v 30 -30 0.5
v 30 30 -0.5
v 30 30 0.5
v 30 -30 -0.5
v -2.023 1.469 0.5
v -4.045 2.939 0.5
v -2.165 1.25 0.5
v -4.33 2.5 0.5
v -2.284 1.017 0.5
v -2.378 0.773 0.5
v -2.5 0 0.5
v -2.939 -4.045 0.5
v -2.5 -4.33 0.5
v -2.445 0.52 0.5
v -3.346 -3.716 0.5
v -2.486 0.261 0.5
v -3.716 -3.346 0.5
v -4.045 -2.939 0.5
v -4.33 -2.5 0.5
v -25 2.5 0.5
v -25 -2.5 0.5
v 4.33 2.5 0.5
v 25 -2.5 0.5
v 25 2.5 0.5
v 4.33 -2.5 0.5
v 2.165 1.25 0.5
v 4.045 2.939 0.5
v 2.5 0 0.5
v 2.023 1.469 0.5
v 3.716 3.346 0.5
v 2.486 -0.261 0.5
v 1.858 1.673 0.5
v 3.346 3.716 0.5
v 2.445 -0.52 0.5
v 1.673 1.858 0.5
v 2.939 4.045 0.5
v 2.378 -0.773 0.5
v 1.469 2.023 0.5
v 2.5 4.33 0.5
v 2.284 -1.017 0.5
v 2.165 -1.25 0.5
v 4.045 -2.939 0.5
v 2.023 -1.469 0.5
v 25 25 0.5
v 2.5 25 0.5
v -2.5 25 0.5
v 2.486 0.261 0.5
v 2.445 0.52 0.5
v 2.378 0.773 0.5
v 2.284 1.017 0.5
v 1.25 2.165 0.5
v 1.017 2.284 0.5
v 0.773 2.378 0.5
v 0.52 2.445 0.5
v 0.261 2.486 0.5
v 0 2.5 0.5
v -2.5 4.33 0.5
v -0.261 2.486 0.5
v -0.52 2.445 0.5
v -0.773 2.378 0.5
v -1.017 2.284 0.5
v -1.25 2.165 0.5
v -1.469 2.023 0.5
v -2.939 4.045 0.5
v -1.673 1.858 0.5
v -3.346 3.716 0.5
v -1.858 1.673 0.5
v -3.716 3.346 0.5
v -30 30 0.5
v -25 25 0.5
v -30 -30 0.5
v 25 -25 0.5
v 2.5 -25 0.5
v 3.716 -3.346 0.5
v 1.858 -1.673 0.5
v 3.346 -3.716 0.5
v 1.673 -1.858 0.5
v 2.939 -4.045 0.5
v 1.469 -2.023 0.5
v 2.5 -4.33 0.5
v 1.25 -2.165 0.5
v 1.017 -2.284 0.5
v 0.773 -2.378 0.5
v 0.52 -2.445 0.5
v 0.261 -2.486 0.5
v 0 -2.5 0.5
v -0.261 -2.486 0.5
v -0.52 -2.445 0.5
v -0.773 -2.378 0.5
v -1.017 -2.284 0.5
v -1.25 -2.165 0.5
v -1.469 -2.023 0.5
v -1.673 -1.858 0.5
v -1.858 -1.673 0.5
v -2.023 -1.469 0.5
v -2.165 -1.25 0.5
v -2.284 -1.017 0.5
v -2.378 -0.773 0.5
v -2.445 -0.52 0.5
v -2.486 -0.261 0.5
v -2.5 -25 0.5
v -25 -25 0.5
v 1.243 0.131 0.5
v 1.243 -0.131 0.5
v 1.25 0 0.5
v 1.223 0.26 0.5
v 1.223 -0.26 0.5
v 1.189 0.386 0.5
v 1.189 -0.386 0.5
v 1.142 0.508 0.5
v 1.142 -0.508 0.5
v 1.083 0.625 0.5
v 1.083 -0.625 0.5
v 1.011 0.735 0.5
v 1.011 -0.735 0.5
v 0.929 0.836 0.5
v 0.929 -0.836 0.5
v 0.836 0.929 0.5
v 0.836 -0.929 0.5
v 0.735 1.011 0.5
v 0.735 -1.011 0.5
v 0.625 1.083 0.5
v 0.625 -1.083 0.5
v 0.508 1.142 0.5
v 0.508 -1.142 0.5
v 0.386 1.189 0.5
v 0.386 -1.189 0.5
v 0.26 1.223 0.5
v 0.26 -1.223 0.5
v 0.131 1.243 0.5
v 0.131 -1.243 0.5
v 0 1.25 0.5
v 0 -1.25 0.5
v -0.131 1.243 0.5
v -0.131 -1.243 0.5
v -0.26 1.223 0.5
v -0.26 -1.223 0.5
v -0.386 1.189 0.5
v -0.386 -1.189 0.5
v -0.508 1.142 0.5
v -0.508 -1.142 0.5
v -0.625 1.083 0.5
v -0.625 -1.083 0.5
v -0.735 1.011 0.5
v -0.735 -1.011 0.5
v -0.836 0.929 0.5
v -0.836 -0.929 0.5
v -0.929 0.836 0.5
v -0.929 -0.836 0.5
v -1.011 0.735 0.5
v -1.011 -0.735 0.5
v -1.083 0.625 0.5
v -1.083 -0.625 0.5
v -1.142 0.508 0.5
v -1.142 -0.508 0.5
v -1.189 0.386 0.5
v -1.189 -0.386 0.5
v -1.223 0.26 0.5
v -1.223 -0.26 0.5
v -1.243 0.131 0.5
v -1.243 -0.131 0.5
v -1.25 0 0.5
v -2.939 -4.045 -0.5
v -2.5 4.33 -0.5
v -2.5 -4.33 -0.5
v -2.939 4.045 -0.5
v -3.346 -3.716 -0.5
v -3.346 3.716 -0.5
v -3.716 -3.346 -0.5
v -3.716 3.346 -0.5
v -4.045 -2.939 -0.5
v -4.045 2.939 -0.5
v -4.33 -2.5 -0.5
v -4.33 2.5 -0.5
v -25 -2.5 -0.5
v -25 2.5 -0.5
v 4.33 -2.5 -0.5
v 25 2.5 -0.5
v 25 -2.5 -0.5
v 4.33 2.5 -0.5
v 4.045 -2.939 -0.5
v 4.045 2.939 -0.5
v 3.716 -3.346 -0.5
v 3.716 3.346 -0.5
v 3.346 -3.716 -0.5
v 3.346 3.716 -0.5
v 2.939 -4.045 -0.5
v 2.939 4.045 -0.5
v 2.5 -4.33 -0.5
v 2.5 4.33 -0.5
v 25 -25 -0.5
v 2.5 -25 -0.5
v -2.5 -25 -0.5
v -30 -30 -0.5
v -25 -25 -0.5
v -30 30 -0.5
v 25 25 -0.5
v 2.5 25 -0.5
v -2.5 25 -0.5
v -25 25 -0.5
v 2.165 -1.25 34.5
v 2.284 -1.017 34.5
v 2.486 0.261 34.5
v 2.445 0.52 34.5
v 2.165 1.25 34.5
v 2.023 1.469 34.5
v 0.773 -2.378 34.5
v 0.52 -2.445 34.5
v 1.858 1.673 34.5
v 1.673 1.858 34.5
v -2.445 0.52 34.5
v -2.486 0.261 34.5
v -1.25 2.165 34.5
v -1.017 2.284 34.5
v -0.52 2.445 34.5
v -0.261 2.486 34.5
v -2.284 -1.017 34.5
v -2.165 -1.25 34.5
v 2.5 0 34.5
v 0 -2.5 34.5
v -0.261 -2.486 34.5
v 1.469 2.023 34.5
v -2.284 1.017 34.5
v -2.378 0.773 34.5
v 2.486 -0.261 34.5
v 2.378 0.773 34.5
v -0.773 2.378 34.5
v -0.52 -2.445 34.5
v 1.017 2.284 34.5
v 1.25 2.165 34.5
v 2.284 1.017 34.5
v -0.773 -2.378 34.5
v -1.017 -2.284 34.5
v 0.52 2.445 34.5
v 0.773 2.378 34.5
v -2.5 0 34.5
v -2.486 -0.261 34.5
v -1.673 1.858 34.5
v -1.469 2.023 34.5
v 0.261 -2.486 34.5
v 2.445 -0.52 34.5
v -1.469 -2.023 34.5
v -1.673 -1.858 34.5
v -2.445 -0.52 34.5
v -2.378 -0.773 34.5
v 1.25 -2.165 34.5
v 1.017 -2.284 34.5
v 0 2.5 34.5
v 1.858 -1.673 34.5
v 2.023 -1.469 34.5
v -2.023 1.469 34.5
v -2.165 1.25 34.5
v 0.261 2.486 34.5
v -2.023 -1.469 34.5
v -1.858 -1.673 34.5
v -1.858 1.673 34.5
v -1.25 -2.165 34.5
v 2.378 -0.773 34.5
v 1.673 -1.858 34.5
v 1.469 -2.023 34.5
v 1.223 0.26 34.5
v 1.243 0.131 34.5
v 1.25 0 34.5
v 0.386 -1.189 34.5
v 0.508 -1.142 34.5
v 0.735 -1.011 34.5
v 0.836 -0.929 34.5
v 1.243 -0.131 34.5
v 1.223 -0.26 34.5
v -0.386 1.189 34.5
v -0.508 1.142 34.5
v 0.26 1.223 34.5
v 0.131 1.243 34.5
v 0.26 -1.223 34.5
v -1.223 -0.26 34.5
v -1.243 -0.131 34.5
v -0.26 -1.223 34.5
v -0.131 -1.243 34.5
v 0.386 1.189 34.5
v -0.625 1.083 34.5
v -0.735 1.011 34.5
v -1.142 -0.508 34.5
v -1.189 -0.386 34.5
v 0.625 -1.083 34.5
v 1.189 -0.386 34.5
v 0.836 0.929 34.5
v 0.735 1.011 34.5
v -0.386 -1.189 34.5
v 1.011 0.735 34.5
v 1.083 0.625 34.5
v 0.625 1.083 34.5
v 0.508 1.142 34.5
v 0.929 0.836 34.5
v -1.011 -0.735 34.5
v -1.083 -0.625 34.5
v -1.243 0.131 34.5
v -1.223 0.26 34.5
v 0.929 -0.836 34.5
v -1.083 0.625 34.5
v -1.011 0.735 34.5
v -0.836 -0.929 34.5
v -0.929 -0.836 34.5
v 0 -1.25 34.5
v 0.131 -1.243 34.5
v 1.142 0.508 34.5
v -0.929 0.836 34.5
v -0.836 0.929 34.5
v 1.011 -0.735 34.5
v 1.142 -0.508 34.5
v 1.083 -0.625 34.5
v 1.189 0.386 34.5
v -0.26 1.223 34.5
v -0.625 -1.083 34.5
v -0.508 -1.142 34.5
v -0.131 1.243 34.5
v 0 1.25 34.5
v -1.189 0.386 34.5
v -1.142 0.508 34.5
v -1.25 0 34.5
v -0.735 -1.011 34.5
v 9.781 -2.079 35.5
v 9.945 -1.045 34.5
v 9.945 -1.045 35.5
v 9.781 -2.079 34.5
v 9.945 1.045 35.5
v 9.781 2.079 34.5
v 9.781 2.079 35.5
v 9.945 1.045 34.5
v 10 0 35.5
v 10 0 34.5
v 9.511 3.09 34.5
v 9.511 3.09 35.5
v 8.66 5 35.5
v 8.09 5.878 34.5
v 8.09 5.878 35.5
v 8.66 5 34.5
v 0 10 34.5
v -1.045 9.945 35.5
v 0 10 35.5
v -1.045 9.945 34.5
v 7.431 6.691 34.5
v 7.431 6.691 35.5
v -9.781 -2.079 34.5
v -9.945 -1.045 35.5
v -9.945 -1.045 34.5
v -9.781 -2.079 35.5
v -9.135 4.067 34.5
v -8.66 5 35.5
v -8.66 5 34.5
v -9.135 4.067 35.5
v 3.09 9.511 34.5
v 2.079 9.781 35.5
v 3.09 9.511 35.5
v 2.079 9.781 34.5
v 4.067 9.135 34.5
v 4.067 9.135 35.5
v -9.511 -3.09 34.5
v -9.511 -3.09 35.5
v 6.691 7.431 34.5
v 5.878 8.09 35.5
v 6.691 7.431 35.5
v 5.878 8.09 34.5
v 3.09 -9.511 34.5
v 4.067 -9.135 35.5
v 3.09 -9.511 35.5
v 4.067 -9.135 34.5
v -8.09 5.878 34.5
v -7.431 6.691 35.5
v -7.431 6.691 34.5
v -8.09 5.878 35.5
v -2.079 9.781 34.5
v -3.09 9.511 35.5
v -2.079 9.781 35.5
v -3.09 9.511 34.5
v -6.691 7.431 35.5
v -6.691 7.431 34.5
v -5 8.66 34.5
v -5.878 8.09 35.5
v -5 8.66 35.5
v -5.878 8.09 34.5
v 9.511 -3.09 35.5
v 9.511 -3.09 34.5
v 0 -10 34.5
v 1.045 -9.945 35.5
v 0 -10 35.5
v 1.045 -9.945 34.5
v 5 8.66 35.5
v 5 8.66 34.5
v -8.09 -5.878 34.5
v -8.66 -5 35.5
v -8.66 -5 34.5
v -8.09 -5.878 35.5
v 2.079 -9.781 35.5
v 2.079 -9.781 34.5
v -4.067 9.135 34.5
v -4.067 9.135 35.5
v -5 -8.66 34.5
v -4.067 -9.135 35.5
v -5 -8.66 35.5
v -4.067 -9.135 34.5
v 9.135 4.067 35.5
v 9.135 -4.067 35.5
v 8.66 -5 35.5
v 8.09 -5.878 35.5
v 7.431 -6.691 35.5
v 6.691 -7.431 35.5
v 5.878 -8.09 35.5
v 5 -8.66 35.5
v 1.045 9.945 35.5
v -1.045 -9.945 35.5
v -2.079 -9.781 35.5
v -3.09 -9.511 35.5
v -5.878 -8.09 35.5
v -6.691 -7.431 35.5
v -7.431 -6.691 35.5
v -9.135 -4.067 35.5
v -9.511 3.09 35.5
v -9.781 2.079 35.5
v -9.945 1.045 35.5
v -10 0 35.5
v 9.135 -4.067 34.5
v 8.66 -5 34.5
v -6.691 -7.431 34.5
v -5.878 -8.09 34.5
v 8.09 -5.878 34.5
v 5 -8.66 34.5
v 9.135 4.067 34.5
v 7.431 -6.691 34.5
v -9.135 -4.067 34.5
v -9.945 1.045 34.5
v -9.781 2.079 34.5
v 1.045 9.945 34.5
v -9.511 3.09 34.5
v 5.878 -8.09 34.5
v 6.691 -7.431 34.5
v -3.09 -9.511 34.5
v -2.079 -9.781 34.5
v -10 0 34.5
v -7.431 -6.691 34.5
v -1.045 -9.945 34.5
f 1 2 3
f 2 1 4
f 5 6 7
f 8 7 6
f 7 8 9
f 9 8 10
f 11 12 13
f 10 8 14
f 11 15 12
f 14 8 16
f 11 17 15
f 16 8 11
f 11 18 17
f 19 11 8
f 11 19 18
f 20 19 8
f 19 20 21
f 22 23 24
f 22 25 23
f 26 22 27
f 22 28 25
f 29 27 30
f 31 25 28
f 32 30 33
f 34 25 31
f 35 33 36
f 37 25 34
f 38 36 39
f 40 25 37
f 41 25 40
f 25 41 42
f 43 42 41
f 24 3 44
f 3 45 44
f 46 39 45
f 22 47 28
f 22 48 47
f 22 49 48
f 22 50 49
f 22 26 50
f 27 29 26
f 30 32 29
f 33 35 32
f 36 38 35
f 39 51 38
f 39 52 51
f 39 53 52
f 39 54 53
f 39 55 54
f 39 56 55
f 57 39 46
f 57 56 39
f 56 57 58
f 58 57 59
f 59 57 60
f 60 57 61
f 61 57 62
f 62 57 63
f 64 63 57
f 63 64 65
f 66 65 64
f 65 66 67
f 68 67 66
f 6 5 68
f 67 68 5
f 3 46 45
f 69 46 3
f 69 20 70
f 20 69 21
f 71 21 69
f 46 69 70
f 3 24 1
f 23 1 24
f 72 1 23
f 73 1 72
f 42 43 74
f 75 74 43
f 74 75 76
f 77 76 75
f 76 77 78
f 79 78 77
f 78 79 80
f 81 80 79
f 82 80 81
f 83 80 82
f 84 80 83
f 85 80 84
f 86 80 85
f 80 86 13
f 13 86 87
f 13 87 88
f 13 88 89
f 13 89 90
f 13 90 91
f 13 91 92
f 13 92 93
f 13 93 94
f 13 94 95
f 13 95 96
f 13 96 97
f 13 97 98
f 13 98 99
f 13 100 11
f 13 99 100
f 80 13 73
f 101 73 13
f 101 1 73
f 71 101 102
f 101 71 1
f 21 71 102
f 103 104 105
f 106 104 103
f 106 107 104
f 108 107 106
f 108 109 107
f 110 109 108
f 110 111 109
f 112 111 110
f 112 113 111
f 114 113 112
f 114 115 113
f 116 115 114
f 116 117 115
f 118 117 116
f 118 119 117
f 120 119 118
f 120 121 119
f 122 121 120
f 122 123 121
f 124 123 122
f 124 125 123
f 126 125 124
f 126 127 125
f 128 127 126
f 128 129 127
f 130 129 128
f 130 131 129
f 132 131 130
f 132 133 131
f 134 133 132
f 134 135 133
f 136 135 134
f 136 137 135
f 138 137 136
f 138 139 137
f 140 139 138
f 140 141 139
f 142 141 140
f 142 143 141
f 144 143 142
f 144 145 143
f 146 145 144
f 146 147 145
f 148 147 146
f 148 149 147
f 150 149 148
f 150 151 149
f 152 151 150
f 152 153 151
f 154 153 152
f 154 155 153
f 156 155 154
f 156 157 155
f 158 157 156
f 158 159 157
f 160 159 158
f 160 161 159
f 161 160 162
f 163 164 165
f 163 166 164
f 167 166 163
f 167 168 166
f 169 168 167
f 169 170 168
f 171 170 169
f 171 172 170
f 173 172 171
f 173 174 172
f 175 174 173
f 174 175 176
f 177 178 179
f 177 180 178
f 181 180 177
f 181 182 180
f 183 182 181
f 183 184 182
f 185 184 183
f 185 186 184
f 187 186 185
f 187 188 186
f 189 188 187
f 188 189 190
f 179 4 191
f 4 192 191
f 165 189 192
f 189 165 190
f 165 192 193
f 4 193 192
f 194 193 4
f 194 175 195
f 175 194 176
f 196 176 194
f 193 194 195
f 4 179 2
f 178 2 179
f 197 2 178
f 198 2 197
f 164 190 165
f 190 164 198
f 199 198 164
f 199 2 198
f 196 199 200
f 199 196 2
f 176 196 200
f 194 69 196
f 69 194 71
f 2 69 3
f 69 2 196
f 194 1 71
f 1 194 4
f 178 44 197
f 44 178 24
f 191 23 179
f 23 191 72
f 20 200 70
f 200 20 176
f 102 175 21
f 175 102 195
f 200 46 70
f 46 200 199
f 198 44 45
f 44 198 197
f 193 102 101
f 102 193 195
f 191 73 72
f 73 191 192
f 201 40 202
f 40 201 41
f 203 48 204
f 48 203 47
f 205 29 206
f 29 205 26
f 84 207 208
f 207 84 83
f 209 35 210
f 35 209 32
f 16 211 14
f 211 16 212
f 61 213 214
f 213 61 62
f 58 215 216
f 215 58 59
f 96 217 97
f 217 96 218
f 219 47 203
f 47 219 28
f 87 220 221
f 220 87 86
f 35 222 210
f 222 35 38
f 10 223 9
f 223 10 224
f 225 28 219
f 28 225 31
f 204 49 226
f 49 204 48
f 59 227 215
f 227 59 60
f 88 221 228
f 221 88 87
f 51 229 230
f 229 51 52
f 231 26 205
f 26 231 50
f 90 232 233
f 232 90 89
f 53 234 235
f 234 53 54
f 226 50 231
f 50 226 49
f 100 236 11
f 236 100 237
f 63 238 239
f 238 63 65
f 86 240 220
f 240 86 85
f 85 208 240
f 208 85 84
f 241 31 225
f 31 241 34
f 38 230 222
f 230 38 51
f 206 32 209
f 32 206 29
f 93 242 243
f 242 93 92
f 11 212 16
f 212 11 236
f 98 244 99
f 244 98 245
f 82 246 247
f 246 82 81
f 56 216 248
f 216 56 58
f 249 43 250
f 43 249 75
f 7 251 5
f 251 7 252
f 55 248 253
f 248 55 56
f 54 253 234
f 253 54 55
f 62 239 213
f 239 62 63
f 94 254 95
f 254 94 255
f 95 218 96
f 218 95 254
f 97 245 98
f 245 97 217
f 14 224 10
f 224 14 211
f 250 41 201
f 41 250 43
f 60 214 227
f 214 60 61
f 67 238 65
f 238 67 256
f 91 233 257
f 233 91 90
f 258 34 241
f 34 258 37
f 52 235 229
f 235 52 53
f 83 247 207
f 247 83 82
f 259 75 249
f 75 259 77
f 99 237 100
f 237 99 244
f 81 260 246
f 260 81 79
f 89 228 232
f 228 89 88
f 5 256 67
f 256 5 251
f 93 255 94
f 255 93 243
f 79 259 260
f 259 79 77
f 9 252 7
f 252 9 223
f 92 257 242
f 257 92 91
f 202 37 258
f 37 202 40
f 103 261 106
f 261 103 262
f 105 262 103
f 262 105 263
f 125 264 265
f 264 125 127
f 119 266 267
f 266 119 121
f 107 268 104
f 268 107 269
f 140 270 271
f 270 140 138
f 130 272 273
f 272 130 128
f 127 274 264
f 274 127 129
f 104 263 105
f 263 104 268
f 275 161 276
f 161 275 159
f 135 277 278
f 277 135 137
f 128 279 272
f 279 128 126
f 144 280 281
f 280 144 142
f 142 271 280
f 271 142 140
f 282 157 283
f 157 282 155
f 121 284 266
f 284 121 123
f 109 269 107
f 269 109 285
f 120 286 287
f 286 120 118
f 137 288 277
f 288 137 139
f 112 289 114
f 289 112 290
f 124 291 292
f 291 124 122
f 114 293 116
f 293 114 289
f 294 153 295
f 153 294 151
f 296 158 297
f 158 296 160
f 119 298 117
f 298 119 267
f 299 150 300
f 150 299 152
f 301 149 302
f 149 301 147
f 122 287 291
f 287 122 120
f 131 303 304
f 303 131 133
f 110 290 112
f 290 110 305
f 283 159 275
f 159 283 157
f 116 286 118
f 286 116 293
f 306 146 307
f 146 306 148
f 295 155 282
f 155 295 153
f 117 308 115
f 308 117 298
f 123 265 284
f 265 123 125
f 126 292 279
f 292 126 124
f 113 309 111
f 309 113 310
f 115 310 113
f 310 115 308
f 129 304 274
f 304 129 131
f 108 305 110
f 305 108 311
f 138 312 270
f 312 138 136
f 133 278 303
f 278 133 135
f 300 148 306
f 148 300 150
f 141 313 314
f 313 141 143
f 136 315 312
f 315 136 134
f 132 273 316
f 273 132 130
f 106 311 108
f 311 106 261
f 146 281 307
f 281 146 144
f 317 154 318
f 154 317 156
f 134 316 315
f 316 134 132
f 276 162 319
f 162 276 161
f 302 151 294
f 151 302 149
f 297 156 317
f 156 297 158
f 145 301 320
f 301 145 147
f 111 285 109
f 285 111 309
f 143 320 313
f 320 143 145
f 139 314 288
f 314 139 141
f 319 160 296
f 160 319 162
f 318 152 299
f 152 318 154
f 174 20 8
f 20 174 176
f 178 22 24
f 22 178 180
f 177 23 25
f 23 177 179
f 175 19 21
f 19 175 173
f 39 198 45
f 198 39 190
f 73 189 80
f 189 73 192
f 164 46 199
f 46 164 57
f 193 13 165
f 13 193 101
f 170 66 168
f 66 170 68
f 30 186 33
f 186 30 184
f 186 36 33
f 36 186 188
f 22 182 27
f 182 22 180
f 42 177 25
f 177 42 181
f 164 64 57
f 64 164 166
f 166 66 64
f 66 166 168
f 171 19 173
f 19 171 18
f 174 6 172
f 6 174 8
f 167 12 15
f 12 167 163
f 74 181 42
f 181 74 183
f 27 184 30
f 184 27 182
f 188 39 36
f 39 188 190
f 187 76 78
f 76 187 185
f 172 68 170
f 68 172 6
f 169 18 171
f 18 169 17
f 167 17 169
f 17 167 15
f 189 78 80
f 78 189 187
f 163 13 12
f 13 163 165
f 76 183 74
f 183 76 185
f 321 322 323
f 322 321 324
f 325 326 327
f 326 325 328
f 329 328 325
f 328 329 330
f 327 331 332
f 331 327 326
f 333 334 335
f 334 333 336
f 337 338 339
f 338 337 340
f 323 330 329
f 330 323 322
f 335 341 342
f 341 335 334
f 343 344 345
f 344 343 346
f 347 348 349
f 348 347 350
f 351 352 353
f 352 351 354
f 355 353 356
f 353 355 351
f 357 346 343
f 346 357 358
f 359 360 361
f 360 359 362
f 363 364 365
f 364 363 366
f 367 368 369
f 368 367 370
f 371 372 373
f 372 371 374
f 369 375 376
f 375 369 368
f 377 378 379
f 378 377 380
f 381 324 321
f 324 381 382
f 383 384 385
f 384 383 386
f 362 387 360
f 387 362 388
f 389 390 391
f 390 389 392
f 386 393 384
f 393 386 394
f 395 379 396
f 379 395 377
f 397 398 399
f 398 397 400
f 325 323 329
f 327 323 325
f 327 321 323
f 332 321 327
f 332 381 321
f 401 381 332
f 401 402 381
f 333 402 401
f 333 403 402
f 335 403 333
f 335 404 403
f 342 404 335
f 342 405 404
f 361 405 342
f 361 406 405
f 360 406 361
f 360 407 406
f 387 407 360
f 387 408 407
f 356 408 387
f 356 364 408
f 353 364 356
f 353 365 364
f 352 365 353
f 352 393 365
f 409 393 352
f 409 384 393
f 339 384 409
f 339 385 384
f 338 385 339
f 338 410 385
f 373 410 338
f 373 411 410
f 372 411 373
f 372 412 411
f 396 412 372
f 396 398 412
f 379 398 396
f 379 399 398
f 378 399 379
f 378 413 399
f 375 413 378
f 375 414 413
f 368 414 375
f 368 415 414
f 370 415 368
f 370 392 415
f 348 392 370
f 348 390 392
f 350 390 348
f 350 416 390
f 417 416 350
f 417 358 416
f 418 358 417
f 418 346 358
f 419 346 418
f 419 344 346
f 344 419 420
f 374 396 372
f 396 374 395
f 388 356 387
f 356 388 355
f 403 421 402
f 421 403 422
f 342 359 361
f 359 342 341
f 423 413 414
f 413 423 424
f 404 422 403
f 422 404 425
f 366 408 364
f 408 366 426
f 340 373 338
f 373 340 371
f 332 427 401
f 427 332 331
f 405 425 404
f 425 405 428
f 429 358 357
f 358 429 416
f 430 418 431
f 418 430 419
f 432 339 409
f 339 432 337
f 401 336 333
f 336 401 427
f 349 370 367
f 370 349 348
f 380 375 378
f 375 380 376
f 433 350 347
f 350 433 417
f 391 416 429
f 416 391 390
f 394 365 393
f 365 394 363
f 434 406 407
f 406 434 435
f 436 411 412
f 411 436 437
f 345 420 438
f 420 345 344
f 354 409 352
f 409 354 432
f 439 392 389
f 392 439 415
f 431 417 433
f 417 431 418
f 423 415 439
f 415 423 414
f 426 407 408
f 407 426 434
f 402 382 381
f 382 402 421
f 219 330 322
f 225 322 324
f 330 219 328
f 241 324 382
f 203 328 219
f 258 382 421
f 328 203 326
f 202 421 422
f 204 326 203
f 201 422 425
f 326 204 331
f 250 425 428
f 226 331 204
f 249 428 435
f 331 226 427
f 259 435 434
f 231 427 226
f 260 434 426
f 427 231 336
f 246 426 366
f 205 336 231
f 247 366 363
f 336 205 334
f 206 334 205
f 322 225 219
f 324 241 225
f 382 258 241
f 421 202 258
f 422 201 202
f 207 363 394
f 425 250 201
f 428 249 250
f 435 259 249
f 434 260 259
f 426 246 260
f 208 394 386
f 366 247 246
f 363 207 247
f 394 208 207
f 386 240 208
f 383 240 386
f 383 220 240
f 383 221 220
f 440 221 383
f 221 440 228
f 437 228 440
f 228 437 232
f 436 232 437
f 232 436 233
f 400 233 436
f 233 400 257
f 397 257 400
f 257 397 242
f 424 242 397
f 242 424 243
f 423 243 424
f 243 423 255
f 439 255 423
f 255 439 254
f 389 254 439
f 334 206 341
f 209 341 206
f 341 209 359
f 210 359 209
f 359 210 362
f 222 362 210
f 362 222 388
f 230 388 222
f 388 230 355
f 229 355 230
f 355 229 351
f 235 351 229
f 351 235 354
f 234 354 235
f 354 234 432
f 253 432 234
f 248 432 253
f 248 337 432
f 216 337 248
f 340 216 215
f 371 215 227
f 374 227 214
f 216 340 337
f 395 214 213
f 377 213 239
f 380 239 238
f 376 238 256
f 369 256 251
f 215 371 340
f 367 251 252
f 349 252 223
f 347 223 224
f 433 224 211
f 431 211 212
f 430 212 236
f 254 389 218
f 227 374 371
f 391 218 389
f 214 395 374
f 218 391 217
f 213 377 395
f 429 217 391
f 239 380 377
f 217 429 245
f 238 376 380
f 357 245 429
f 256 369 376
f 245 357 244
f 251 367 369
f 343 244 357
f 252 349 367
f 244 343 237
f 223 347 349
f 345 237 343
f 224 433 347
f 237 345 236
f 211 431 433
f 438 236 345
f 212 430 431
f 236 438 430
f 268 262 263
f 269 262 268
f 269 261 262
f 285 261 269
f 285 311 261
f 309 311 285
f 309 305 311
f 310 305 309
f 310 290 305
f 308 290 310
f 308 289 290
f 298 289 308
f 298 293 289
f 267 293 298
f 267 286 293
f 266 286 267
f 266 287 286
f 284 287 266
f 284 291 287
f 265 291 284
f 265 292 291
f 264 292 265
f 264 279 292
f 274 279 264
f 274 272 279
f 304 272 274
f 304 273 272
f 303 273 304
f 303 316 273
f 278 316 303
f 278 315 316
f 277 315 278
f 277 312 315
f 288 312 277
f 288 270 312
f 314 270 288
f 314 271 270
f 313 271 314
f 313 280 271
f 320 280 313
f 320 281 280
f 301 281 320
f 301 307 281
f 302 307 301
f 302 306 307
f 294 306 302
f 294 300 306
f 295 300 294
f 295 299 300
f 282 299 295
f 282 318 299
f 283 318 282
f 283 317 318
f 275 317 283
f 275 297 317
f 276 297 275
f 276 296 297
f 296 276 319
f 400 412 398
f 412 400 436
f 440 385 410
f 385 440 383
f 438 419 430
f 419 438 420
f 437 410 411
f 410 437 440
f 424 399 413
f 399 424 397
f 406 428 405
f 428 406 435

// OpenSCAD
// Rod Height
rod_height = 35; // [1:150]

// Rod Diameter
rod_diameter=5; // [2:20]

// Wall Cylinder Base Diameter
base_diameter = 20; // [10:100]

// Photo Frame Base Width
frame_width=60; // [10:150]

/* [Hidden] */

$fn=60;
rod_half=rod_height/2;

quarter_frame=(frame_width-(rod_diameter*3))/2;

difference()
{
    cube([frame_width,frame_width,1], center=true);
    cube([frame_width-(rod_diameter*2),frame_width-(rod_diameter*2),1], center=true);
}

cube([frame_width,rod_diameter,1], center=true);
cube([rod_diameter,frame_width,1], center=true);
cylinder(h=1, r=rod_diameter, center=true);

translate([0,0,rod_half]) 
{
    difference()
    {
        cylinder(h=rod_height, r=rod_diameter/2, center=true);
        cylinder(h=rod_height, r=rod_diameter/4, center=true);
    }
}

translate([0,0,rod_height])
{
    cylinder(h=1,r=base_diameter/2, center=true);
}
